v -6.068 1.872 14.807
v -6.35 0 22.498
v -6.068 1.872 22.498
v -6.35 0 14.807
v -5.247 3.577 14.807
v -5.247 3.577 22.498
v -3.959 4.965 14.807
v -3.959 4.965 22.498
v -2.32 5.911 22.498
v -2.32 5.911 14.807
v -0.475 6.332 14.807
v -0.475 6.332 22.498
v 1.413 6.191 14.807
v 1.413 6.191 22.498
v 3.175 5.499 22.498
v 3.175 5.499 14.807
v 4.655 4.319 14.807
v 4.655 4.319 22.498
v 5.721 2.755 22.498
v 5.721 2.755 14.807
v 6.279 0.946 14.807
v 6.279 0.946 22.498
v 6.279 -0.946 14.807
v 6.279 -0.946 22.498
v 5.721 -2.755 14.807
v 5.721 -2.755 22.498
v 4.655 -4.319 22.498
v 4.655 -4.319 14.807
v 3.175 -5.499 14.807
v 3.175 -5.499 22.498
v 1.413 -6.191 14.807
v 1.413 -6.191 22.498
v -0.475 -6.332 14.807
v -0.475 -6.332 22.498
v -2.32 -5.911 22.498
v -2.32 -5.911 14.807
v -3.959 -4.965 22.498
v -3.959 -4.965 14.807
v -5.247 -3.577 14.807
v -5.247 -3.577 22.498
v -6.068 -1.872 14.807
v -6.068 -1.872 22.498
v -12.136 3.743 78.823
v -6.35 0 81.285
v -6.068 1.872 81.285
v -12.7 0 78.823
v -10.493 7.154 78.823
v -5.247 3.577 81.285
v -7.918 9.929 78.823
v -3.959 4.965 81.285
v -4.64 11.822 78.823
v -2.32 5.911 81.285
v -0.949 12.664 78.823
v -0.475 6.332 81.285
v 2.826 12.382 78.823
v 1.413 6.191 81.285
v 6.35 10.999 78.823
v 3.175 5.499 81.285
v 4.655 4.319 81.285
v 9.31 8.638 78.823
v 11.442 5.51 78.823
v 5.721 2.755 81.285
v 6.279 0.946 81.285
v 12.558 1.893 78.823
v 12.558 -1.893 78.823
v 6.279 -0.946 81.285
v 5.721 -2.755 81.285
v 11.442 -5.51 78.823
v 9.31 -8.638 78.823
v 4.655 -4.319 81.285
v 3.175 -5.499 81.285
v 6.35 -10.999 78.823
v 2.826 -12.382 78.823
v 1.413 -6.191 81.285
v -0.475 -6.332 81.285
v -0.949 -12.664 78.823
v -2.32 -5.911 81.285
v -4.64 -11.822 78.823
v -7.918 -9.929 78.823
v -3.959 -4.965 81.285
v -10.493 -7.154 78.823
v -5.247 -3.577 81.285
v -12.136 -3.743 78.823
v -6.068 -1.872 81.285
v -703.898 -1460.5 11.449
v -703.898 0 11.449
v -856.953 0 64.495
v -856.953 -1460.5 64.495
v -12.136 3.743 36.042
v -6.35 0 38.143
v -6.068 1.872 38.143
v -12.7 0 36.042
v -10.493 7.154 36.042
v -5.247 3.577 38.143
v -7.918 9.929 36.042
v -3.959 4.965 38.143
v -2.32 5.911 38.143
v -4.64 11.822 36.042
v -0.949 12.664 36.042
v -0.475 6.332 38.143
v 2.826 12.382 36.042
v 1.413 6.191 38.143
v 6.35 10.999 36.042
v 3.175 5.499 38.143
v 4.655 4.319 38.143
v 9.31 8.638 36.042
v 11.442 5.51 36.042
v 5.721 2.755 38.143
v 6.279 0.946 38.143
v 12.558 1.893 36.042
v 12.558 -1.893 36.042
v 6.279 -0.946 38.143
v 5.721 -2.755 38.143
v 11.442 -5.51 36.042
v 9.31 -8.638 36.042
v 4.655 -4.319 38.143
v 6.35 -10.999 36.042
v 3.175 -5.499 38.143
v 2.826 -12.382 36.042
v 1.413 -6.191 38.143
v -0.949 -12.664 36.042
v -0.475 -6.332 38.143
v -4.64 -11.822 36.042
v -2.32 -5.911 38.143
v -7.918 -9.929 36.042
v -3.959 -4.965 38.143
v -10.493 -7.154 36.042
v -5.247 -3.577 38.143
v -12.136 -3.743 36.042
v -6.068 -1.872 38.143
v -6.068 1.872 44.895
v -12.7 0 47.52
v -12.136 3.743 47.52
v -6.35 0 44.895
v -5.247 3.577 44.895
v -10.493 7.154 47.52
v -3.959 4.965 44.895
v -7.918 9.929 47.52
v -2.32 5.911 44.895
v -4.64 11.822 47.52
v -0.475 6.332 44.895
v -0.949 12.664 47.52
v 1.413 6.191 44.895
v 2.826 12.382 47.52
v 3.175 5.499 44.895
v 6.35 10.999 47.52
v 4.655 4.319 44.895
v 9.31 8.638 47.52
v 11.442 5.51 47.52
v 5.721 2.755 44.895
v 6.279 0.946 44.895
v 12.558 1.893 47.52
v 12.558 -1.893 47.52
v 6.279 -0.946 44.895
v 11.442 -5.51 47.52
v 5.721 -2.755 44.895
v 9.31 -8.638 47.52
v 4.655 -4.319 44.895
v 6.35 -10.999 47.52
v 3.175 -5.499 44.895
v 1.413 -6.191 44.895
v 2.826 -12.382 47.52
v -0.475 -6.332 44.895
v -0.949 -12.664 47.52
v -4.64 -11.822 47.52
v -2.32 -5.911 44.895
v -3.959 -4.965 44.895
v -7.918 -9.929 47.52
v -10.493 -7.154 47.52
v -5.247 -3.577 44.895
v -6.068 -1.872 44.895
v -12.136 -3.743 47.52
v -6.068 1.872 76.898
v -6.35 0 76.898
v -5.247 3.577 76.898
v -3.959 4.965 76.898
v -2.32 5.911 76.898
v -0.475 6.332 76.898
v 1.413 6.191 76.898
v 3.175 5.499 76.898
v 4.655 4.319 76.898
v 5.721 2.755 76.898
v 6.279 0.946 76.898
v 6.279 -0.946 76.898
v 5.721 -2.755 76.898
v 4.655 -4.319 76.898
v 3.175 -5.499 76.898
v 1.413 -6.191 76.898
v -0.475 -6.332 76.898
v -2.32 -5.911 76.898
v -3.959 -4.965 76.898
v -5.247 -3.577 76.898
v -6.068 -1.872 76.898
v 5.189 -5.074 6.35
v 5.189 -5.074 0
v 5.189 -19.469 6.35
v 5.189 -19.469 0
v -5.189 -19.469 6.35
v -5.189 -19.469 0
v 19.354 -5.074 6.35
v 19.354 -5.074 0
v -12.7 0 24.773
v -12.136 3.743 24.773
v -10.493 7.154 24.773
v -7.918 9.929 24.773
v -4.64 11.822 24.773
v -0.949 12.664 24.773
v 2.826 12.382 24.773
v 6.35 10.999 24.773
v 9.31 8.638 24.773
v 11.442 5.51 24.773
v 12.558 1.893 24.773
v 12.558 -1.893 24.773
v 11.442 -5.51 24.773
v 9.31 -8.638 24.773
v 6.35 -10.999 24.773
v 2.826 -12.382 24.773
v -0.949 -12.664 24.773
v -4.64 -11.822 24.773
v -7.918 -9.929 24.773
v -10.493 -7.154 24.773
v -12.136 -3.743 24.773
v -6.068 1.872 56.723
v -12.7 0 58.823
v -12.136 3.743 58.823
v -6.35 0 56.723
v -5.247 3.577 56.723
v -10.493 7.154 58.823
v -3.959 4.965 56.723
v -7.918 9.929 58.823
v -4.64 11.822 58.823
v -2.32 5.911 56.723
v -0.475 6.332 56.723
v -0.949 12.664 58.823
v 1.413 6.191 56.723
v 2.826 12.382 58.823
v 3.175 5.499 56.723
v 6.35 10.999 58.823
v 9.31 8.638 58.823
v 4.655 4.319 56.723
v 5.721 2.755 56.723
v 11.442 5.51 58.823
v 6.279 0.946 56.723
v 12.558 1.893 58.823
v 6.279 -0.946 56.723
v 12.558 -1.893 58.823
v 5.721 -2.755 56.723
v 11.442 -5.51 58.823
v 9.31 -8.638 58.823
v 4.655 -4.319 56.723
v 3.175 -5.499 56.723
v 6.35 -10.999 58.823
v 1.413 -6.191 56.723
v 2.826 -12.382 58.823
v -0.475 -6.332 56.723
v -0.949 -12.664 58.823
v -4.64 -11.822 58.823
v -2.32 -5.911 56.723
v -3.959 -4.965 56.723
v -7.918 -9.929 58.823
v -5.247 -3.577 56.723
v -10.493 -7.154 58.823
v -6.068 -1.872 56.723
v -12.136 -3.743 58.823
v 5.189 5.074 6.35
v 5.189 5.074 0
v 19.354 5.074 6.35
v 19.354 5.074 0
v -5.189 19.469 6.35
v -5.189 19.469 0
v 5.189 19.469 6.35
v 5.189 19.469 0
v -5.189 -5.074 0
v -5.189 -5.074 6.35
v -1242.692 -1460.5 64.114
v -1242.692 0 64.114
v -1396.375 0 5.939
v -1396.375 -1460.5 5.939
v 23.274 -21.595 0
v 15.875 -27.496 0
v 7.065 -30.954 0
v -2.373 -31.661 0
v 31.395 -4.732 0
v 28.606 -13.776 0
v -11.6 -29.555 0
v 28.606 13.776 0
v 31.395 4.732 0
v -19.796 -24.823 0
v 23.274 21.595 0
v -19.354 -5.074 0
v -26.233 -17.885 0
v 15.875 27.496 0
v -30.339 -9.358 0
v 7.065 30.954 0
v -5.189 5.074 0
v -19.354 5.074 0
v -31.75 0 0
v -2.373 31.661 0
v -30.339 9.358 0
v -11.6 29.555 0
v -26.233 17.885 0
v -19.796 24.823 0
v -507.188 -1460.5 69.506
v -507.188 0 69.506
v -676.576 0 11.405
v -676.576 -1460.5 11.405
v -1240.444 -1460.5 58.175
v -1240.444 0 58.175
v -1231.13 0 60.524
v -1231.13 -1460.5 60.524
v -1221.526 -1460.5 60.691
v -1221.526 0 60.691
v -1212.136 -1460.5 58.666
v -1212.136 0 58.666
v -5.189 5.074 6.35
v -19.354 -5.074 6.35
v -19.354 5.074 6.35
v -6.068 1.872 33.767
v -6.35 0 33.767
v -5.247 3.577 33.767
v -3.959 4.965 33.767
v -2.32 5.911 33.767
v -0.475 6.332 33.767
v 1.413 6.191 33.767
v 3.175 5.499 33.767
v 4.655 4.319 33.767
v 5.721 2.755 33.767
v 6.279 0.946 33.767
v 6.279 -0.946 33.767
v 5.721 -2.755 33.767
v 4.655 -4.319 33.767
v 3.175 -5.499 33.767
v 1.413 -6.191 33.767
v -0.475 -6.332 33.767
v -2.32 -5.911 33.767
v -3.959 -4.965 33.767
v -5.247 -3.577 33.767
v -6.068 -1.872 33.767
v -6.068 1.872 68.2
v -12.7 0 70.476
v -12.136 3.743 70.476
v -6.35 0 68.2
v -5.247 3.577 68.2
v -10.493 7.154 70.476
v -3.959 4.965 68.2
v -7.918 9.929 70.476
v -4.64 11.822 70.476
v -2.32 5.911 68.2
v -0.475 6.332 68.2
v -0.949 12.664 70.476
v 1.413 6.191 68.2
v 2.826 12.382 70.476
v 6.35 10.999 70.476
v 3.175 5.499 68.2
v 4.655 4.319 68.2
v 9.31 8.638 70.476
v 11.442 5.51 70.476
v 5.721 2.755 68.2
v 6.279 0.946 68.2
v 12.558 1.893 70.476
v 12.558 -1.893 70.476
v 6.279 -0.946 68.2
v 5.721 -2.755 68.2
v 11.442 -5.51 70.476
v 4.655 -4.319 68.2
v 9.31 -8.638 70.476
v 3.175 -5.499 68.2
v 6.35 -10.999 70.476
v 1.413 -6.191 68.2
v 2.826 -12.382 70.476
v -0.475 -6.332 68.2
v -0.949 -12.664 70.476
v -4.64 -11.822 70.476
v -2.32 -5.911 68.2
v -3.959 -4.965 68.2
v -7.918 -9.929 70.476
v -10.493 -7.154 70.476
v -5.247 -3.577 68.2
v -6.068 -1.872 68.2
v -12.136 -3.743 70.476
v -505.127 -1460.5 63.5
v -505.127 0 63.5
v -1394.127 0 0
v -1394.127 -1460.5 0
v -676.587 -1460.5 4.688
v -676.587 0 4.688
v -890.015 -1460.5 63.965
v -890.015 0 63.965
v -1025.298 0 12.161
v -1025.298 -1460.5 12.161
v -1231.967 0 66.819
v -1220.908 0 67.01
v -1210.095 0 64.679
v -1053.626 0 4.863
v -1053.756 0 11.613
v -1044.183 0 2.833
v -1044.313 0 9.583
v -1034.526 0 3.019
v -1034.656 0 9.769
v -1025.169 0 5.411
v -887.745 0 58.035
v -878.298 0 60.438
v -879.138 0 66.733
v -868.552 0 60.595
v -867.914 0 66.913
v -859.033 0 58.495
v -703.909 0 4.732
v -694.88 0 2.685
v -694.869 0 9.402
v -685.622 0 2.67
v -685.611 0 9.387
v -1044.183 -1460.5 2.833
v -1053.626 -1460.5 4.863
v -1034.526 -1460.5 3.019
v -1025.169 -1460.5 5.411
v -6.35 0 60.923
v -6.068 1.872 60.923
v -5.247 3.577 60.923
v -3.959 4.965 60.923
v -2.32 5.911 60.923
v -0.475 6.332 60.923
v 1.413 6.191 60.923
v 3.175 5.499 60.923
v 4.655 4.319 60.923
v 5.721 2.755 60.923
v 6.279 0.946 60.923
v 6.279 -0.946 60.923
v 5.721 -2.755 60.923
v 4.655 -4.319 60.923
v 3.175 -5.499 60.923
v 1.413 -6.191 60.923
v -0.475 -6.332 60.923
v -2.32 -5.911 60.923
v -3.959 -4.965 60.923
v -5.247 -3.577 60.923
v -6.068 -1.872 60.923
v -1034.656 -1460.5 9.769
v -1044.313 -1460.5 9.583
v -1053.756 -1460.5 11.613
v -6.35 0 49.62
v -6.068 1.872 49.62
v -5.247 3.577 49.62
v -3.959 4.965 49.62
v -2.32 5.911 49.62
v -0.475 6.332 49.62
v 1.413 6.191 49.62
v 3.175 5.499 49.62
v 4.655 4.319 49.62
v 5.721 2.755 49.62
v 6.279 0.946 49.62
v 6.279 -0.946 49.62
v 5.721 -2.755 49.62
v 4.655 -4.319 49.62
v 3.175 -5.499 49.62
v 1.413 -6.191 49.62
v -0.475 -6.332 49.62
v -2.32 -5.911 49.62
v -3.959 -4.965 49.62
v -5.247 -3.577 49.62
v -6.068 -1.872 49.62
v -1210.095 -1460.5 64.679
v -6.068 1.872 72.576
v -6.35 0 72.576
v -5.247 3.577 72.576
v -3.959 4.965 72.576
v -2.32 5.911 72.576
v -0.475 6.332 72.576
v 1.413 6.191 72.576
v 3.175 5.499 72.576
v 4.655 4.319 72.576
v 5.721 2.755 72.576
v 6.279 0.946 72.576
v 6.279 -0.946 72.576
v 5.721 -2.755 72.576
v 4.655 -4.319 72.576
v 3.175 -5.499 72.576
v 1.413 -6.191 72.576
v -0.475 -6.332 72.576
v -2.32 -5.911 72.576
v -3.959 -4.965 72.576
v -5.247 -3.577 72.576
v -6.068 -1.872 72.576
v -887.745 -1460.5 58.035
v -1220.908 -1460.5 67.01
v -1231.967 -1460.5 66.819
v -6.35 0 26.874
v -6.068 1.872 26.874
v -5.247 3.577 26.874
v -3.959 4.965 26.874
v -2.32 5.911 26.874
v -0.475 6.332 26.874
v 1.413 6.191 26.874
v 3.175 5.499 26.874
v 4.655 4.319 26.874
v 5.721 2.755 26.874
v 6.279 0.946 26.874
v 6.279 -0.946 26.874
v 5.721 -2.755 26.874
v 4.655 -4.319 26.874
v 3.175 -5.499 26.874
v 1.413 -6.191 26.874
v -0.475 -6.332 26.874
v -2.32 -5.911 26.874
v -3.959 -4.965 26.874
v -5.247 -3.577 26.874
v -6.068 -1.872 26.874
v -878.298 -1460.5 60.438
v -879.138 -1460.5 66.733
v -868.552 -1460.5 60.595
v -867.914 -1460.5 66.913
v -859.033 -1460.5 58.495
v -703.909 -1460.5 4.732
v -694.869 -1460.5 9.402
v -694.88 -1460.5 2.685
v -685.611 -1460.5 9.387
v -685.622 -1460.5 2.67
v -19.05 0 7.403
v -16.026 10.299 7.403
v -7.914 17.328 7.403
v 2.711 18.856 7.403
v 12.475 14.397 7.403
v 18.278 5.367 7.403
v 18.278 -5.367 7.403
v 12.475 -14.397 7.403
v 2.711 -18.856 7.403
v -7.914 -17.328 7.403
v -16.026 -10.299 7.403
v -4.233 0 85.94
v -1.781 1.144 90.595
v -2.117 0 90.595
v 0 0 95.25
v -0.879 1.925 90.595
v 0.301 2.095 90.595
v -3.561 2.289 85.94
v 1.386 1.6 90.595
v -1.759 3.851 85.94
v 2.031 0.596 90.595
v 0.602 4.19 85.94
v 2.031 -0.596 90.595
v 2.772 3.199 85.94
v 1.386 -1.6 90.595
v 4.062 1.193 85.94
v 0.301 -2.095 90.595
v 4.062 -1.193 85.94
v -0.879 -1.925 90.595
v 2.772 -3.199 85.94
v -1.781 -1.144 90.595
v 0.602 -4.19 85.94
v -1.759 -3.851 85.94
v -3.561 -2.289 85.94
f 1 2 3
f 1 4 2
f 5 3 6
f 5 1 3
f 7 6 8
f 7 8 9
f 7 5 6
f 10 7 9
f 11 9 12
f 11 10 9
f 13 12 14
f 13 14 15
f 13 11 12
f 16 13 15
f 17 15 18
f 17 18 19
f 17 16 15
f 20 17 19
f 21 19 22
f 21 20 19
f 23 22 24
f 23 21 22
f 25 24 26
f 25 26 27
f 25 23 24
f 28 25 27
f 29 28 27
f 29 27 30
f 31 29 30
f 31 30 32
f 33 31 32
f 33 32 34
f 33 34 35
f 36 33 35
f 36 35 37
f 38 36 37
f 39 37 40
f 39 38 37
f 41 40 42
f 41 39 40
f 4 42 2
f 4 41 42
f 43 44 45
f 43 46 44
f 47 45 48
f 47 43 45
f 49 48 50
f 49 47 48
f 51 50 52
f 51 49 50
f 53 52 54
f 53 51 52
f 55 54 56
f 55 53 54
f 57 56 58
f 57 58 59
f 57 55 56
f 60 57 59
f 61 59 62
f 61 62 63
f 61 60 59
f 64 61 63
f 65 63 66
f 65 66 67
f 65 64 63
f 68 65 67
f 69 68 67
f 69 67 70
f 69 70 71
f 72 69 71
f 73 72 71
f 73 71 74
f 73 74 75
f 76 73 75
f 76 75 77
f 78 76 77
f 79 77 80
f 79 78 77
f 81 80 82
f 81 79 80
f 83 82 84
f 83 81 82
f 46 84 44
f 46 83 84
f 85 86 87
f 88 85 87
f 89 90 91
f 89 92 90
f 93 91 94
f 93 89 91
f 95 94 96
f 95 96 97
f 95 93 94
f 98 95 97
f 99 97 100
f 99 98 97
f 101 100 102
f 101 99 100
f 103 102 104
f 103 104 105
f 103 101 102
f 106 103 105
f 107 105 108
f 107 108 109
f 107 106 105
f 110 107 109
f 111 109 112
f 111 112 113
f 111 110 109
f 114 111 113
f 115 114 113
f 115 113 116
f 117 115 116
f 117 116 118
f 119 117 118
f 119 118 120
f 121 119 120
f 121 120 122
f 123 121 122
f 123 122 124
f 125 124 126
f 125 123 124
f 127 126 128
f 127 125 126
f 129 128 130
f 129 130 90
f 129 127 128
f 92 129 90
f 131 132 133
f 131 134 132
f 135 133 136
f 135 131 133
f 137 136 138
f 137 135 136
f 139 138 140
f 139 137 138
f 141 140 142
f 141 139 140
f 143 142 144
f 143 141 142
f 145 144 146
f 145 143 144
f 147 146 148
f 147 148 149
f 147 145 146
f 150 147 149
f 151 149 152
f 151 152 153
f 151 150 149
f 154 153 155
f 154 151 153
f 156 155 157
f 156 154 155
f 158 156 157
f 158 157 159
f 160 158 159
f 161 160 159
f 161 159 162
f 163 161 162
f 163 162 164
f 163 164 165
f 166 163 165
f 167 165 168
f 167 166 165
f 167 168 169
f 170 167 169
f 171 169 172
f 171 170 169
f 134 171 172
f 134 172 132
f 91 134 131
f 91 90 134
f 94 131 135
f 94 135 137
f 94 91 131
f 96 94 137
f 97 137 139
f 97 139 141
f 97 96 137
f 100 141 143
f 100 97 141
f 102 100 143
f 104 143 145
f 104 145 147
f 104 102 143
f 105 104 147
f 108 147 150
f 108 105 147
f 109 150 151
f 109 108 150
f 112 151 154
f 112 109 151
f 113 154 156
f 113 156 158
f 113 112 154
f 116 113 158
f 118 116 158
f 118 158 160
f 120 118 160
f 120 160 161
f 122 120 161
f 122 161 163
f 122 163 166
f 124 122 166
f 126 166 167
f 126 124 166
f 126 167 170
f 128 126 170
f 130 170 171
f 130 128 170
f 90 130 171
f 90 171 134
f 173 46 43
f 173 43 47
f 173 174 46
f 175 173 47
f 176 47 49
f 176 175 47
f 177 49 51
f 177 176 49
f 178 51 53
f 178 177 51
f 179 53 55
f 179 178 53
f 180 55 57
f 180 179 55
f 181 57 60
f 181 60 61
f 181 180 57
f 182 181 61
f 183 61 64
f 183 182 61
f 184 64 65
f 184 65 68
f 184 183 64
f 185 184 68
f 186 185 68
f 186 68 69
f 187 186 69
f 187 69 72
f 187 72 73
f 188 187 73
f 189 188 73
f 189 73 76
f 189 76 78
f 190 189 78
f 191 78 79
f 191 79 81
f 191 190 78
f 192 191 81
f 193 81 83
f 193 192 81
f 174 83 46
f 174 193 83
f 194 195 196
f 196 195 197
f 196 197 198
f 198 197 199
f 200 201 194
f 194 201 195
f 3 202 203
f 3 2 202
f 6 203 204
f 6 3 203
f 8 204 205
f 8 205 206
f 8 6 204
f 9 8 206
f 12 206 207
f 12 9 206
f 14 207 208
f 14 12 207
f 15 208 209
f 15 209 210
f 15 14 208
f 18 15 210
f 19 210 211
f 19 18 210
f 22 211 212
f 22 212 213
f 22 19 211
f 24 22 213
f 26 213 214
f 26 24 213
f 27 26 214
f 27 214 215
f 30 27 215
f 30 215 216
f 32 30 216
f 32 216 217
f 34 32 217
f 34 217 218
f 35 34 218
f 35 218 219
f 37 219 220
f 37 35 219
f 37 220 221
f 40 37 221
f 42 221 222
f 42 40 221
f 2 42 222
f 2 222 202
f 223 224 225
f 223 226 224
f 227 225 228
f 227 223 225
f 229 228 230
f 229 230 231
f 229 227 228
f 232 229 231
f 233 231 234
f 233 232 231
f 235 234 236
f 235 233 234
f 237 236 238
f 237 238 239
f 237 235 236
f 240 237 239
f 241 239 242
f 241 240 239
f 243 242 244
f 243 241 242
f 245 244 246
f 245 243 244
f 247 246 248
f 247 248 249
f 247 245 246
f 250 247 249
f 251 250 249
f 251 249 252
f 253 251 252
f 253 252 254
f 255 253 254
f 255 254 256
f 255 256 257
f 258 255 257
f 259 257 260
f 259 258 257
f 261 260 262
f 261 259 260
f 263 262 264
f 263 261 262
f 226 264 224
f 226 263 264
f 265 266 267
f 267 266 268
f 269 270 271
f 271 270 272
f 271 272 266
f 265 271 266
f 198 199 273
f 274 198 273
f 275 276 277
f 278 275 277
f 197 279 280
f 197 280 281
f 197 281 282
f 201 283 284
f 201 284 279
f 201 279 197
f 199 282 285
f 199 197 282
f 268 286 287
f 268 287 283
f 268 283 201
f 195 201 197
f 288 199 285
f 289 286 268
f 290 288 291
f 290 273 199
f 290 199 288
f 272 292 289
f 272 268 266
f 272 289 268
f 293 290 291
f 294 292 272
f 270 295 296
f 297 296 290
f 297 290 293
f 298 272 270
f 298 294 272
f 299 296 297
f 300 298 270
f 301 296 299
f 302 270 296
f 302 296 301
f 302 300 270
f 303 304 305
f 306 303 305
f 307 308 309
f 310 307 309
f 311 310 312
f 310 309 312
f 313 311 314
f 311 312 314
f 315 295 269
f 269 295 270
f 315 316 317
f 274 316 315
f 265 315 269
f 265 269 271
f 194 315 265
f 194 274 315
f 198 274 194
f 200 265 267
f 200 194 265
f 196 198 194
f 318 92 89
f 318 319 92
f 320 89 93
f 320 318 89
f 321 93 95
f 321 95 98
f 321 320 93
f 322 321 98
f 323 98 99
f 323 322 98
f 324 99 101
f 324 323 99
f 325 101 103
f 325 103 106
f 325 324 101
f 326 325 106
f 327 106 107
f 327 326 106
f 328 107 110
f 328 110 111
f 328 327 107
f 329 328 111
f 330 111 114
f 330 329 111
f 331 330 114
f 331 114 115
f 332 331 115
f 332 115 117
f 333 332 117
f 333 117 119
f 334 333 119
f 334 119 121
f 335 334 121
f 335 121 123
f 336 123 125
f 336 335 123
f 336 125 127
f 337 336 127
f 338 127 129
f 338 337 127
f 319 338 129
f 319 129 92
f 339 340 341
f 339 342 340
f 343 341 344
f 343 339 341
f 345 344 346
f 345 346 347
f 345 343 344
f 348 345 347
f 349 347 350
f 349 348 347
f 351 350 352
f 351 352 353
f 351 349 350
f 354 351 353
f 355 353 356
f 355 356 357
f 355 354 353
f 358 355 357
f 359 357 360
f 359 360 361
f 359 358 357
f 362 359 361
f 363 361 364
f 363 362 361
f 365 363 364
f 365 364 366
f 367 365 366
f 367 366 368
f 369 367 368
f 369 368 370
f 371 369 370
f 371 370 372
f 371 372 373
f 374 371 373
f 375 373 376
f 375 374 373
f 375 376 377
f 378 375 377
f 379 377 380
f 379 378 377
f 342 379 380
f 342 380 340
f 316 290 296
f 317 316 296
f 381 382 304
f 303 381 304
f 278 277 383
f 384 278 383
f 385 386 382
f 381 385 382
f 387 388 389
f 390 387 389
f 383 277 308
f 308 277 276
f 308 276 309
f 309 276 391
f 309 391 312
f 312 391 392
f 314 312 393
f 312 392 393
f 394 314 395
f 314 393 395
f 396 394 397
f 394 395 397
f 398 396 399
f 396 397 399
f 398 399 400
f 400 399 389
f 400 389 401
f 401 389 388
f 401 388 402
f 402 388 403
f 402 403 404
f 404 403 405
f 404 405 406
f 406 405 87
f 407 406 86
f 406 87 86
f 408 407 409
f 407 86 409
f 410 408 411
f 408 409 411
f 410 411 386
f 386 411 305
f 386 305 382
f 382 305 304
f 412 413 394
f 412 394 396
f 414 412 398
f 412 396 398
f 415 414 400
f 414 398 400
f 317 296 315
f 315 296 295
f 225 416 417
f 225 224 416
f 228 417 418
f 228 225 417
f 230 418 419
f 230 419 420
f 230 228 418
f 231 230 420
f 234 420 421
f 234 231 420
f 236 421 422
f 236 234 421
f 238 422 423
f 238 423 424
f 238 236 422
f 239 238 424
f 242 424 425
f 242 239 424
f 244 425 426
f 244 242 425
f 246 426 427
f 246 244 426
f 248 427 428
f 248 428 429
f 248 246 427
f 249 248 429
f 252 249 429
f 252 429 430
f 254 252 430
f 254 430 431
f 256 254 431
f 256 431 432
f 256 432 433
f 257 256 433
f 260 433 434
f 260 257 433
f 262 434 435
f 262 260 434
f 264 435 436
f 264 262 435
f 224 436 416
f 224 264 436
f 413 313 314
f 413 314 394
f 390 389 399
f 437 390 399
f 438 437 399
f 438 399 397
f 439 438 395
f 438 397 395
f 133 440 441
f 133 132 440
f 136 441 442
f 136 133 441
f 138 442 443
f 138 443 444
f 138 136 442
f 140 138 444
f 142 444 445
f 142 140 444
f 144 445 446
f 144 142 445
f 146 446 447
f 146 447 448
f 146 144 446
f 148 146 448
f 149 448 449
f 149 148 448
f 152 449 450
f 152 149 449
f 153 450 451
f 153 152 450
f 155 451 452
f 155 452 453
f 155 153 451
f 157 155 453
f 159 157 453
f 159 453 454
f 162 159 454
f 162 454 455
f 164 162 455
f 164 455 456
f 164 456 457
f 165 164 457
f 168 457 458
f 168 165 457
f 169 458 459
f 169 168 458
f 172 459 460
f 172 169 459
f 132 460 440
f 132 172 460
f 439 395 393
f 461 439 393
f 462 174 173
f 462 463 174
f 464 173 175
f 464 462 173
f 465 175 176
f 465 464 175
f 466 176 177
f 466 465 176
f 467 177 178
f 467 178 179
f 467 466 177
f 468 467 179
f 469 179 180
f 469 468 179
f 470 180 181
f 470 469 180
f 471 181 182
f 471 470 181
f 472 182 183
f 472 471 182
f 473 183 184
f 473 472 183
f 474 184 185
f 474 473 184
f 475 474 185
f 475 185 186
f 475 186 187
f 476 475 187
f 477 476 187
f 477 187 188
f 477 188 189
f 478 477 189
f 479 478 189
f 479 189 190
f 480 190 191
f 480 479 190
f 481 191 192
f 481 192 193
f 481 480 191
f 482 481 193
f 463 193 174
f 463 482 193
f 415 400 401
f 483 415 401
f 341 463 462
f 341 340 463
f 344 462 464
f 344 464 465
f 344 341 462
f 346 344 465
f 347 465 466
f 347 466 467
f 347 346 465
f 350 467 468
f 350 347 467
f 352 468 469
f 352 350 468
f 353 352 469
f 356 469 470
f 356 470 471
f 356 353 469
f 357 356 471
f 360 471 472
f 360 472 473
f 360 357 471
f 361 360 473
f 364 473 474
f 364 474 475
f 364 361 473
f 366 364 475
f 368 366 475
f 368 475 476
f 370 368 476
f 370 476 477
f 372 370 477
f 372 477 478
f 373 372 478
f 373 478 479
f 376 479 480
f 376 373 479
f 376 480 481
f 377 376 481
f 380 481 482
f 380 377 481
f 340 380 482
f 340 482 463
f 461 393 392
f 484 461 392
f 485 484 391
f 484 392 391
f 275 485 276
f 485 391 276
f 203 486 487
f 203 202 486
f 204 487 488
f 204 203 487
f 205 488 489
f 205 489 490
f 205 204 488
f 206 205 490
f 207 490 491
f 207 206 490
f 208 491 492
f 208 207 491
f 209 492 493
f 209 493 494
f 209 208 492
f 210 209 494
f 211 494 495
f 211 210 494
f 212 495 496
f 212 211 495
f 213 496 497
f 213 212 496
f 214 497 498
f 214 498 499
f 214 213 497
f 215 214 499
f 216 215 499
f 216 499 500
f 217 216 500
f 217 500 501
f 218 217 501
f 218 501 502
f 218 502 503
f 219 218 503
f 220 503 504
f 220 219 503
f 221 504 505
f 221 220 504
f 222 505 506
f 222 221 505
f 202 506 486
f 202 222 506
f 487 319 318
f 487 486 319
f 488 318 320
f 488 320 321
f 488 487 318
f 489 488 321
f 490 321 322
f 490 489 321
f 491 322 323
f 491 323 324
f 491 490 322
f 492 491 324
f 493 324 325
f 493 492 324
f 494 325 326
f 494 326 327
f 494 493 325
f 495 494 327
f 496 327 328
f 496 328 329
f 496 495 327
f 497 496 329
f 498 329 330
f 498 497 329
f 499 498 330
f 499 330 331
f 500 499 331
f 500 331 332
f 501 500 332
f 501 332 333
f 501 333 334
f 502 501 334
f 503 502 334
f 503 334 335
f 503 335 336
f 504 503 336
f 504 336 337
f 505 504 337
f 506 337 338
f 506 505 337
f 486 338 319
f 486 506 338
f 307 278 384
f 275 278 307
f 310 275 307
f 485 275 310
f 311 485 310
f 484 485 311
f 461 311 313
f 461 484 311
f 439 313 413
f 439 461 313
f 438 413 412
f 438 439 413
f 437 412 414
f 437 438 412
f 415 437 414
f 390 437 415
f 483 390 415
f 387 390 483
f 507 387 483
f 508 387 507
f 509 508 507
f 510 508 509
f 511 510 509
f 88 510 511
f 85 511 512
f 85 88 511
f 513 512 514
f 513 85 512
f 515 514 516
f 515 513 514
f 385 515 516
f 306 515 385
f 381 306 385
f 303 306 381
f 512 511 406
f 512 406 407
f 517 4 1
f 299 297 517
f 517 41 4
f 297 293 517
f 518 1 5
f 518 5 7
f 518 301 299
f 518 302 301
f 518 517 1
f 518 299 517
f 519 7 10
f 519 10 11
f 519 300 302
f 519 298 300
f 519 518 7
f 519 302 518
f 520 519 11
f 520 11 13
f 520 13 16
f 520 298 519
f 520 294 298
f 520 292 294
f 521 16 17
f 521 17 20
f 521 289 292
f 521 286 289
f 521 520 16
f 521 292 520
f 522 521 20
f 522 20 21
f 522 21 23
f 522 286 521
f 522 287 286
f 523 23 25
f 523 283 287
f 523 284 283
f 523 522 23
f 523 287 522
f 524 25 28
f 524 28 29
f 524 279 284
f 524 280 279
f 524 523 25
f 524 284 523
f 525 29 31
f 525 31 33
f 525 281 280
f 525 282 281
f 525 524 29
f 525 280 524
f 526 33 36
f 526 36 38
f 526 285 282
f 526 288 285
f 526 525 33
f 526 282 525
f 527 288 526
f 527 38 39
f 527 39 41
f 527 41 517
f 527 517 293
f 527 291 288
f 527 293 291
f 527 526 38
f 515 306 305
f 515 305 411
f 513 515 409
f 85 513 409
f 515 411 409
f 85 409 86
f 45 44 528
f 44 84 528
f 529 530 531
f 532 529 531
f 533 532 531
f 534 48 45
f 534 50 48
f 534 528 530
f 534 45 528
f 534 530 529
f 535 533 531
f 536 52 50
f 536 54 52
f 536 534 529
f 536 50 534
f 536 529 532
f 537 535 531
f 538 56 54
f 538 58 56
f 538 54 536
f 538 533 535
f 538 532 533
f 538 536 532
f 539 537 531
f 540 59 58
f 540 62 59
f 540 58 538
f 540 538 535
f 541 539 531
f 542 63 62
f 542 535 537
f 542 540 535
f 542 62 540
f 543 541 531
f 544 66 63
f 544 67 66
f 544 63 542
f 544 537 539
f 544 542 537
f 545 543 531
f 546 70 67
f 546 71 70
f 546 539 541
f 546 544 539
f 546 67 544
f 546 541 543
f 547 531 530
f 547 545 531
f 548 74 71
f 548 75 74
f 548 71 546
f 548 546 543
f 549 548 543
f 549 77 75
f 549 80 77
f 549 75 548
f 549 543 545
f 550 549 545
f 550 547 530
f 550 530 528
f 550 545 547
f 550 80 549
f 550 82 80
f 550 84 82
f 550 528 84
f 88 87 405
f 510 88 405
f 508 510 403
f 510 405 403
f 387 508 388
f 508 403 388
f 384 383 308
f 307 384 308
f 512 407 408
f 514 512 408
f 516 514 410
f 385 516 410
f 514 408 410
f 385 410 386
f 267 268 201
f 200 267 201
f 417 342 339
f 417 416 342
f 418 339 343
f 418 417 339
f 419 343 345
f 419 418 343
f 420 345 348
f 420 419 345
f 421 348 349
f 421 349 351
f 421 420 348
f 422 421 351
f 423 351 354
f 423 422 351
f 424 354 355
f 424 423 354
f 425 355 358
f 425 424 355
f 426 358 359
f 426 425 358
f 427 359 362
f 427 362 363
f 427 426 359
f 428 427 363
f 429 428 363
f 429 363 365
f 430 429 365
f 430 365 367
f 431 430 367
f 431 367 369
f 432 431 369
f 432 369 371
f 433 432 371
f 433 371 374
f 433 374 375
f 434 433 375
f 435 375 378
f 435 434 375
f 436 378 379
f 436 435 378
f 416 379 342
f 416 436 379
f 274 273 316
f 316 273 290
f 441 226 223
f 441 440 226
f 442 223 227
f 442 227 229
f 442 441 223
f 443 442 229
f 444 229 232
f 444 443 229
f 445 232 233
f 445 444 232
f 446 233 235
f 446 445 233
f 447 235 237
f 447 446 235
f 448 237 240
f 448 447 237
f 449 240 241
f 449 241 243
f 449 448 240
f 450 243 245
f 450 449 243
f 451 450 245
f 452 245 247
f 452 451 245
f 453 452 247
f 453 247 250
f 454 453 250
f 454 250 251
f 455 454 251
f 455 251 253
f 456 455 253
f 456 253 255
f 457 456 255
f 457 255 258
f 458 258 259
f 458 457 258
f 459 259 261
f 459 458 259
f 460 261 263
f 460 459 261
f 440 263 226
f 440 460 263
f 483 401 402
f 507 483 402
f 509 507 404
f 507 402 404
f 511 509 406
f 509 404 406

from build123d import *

# Parameters (mm, degrees)
F1_DEPTH = 292.1
F5_DEPTH = 1.27
F6_SCALE = 5


with BuildPart() as f1:
    # F0 (on Front) → F1 (new body)
    with BuildSketch(Plane.XZ):
        with BuildLine():
            Line((-279.2750697707, 1.1877493809), (-278.8254572617, 0))
            Line((-278.8254572617, 0), (-248.0888209369, 11.6350944043))
            ThreePointArc((-248.0888209369, 11.6350944043), (-245.2665745211, 12.1766908251), (-242.4272611613, 11.7331807804))
            Line((-242.4272611613, 11.7331807804), (-210.7252976528, 0.9726533622))
            ThreePointArc((-210.7252976528, 0.9726533622), (-207.8699176262, 0.5294370778), (-205.0337024945, 1.0821752597))
            Line((-205.0337024945, 1.0821752597), (-177.5489221499, 11.6069671453))
            ThreePointArc((-177.5489221499, 11.6069671453), (-174.6858817442, 12.1601785727), (-171.8065708865, 11.6990796328))
            Line((-171.8065708865, 11.6990796328), (-140.7817487445, 0.9464140881))
            ThreePointArc((-140.7817487445, 0.9464140881), (-138.0502724457, 0.4842476743), (-135.3173327352, 0.9376802539))
            Line((-135.3173327352, 0.9376802539), (-101.0254572617, 12.7))
            Line((-101.0254572617, 12.7), (-101.4375091841, 13.9012964718))
            Line((-101.4375091841, 13.9012964718), (-135.3151856139, 2.2810494915))
            ThreePointArc((-135.3151856139, 2.2810494915), (-138.0481253243, 1.8276169119), (-140.7796016232, 2.2897833257))
            Line((-140.7796016232, 2.2897833257), (-171.3906809893, 12.8990527964))
            ThreePointArc((-171.3906809893, 12.8990527964), (-174.7062510679, 13.430015212), (-178.0030854744, 12.7929838715))
            Line((-178.0030854744, 12.7929838715), (-205.0596798629, 2.4321579342))
            ThreePointArc((-205.0596798629, 2.4321579342), (-207.8958949946, 1.8794197524), (-210.7512750212, 2.3226360367))
            Line((-210.7512750212, 2.3226360367), (-242.0190615831, 12.9357917334))
            ThreePointArc((-242.0190615831, 12.9357917334), (-245.2885739367, 13.4465002698), (-248.5384334458, 12.8228437852))
            Line((-248.5384334458, 12.8228437852), (-279.2750697707, 1.1877493809))
        make_face()
    extrude(amount=F1_DEPTH)


with BuildPart() as f3:
    # F2 (on Front) → F3 (revolve)
    with BuildSketch(Plane.XZ):
        Polygon((-6.35, 0), (0, 0), (0, 19.05), (-1.27, 16.2569159193), (-2.54, 15.7646145672), (-1.27, 15.379576547), (-1.27, 14.5151677372), (-2.54, 14.0951266512), (-1.27, 13.6400824994), (-1.27, 12.1846198347), (-2.54, 11.7645787487), (-1.27, 11.3445376627), (-1.27, 9.9240780639), (-2.54, 9.5040369779), (-1.27, 8.9789859133), (-1.27, 7.6285332272), (-2.54, 7.2084921412), (-1.27, 6.7534479894), (-1.27, 5.3747256117), (-2.54, 4.9546845257), (-1.27, 4.4996403739), (-1.27, 2.9613055742), align=None)
    revolve(axis=Axis((0, 0, 9.525), (0, 0, -1)))

    # F4 (on face) → F5 (cut)
    with BuildSketch(Plane(origin=(0, 0, 0), x_dir=(1, 0, 0), z_dir=(0, 0, -1))):
        Polygon((1.0378063889, 3.8937258068), (-1.0378063889, 3.8937258068), (-1.0378063889, 1.0148652364), (-3.8707845379, 1.0148652364), (-3.8707845379, -1.0148652364), (-1.0378063889, -1.0148652364), (-1.0378063889, -3.8937258068), (1.0378063889, -3.8937258068), (1.0378063889, -1.0148652364), (3.8707845379, -1.0148652364), (3.8707845379, 1.0148652364), (1.0378063889, 1.0148652364), align=None)
    extrude(amount=-F5_DEPTH, mode=Mode.SUBTRACT)


with BuildPart() as f1_1:
    # F6: moved
    add(f1.part.scale(F6_SCALE))


with BuildPart() as f3_1:
    # F6: moved
    add(f3.part.scale(F6_SCALE))


solid = Compound([f1_1.part, f3_1.part])
